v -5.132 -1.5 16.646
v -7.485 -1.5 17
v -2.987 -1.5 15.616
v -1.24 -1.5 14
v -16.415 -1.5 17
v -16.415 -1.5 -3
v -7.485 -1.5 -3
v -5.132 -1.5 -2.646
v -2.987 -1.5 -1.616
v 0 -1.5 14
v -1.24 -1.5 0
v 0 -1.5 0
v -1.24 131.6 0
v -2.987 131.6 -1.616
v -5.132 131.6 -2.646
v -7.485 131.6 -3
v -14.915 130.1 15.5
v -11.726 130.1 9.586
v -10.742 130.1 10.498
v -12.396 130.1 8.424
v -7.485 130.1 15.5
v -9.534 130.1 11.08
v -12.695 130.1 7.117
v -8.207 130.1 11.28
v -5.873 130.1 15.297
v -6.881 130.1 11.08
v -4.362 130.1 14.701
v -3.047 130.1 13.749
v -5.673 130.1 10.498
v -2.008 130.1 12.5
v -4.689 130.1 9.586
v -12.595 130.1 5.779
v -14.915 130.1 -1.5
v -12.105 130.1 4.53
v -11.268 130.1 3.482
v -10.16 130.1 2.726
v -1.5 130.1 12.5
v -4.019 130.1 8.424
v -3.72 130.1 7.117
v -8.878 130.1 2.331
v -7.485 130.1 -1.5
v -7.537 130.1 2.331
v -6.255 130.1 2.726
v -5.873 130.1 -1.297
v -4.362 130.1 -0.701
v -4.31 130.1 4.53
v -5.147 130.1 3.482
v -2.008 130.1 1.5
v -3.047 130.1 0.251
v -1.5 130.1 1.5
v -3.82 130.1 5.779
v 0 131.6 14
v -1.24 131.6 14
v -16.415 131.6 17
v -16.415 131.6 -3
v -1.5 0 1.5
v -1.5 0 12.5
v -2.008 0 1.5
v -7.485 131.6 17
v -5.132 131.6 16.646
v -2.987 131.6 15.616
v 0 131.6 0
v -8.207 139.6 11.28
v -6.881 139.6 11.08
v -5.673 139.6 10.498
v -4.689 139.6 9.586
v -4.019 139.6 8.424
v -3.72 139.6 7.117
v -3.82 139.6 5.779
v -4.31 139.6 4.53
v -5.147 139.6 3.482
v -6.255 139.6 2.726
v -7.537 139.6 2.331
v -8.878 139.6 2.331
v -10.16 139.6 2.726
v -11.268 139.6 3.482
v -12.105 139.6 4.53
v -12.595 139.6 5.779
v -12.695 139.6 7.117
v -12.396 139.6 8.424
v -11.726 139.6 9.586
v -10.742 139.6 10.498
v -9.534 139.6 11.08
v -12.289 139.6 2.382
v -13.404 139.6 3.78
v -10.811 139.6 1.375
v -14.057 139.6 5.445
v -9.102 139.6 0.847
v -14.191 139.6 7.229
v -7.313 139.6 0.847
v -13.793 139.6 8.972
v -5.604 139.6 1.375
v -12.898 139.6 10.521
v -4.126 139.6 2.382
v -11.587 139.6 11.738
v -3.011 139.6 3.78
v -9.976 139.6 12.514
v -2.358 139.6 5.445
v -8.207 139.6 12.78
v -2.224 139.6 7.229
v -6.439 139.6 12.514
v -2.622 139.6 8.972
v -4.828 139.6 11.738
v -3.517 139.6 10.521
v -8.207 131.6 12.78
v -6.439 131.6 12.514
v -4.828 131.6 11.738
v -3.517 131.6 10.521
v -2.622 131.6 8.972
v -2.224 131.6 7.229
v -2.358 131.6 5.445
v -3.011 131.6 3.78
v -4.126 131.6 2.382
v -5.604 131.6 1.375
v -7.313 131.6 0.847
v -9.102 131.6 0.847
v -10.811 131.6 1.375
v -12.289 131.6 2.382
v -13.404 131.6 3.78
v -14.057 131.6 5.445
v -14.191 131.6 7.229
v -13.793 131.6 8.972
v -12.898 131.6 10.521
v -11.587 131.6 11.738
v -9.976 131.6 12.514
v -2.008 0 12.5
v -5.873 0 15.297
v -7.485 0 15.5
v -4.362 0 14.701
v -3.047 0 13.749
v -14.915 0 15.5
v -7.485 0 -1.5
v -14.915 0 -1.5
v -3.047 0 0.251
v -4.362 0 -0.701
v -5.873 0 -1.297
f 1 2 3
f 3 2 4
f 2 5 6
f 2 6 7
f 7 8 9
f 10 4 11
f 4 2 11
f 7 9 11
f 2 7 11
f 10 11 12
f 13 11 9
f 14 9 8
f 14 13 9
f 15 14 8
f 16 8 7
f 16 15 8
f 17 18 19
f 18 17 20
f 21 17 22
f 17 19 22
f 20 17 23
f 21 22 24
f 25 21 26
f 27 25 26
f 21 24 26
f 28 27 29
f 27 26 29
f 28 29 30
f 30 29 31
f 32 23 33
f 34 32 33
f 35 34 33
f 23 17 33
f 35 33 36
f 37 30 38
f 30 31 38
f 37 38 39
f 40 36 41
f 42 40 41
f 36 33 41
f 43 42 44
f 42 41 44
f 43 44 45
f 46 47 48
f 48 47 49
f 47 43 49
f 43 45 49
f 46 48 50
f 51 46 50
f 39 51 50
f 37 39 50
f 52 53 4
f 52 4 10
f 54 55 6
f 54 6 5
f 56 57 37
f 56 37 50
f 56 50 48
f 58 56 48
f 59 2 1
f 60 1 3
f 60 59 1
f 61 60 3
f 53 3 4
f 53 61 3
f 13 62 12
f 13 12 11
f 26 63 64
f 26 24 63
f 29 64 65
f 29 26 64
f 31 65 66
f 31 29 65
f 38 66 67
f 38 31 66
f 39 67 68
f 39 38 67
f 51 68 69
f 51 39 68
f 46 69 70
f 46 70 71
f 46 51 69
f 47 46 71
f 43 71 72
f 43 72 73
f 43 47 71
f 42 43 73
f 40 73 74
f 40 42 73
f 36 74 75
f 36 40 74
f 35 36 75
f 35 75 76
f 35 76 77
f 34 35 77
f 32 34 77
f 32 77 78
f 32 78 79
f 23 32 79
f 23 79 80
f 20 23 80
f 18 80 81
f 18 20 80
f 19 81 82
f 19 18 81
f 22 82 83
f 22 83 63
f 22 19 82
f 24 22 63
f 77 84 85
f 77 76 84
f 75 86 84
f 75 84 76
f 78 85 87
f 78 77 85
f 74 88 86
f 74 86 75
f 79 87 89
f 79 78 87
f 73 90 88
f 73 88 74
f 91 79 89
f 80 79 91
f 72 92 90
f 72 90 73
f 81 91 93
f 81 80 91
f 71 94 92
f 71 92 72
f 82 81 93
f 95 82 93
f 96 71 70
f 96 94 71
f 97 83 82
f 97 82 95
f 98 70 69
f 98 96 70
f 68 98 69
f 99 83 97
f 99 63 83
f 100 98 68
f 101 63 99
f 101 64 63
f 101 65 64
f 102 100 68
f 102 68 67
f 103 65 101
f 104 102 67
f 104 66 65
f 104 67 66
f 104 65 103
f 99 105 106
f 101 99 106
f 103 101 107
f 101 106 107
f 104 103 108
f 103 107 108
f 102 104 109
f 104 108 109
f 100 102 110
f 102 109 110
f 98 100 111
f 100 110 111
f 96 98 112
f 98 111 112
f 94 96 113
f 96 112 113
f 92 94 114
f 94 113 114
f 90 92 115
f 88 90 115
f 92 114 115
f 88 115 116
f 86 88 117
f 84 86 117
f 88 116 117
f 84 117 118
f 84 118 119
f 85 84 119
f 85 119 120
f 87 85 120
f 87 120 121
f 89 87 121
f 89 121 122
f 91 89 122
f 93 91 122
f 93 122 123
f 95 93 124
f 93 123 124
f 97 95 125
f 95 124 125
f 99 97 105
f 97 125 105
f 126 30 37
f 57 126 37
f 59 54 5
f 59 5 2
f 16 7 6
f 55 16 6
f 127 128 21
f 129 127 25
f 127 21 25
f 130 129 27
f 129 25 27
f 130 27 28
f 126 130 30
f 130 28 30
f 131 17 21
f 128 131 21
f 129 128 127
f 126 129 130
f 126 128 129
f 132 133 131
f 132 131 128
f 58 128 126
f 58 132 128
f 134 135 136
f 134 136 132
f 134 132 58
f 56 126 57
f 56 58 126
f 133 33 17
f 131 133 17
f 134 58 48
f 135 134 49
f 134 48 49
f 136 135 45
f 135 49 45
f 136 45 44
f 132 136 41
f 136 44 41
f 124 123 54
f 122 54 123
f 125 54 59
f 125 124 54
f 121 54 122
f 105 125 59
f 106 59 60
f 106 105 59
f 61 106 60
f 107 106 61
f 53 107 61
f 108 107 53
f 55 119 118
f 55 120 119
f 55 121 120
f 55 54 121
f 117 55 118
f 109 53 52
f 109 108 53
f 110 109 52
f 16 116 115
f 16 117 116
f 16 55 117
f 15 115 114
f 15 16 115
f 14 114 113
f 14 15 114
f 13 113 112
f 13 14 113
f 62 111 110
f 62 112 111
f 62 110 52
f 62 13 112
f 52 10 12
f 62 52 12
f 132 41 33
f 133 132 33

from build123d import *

# Parameters (mm, degrees)
BOSS_EXTRUDE1_DEPTH = 1.5
BOSS_EXTRUDE2_START = 131.6
BOSS_EXTRUDE2_DEPTH = 131.6
BOSS_EXTRUDE3_DEPTH = 1.5
SKETCH4_R           = 6
SKETCH4_R_2         = 4.5
BOSS_EXTRUDE4_DEPTH = 8
CUT_EXTRUDE2_START  = -8
SKETCH6_R           = 4.5
CUT_EXTRUDE2_DEPTH  = 8


with BuildPart() as part:
    # Sketch1 → Boss-Extrude1 (new body)
    with BuildSketch(Plane(origin=(0, 0, 0), x_dir=(1, 0, 0), z_dir=(0, 1, 0))):
        with BuildLine():
            Line((-16.414997998, 3), (-16.414997998, -17))
            Line((-16.414997998, -17), (-7.484997998, -17))
            ThreePointArc((-7.484997998, -17), (-4.020896383, -16.211102551), (-1.24, -14))
            Line((-1.24, -14), (0, -14))
            Line((0, -14), (0, 0))
            Line((0, 0), (-1.24, 0))
            ThreePointArc((-1.24, 0), (-4.020896383, 2.211102551), (-7.484997998, 3))
            Line((-7.484997998, 3), (-16.414997998, 3))
        make_face()
    extrude(amount=-BOSS_EXTRUDE1_DEPTH)

    # Sketch2 → Boss-Extrude2 (add)
    with BuildSketch(Plane(origin=(0, 0, 0), x_dir=(1, 0, 0), z_dir=(0, 1, 0)).offset(BOSS_EXTRUDE2_START)):
        with BuildLine():
            Line((-16.414997998, 3), (-16.414997998, -17))
            Line((-16.414997998, -17), (-7.484997998, -17))
            ThreePointArc((-7.484997998, -17), (-4.020896383, -16.211102551), (-1.24, -14))
            Line((-1.24, -14), (0, -14))
            Line((0, -14), (0, 0))
            Line((0, 0), (-1.24, 0))
            ThreePointArc((-1.24, 0), (-4.020896383, 2.211102551), (-7.484997998, 3))
            Line((-7.484997998, 3), (-16.414997998, 3))
        make_face()
        with BuildLine():
            Line((-7.484997998, 1.5), (-14.914997998, 1.5))
            Line((-14.914997998, 1.5), (-14.914997998, -15.5))
            Line((-14.914997998, -15.5), (-7.484997998, -15.5))
            ThreePointArc((-7.484997998, -15.5), (-4.362498999, -14.700877125), (-2.007772423, -12.5))
            Line((-2.007772423, -12.5), (-1.5, -12.5))
            Line((-1.5, -12.5), (-1.5, -1.5))
            Line((-1.5, -1.5), (-2.007772423, -1.5))
            ThreePointArc((-2.007772423, -1.5), (-4.362498999, 0.700877125), (-7.484997998, 1.5))
        make_face(mode=Mode.SUBTRACT)
    extrude(amount=-BOSS_EXTRUDE2_DEPTH)

    # Sketch3 → Boss-Extrude3 (add)
    with BuildSketch(Plane(origin=(0, 131.6, 0), x_dir=(1, 0, 0), z_dir=(0, 1, 0))):
        with BuildLine():
            Line((-7.484997998, 3), (-16.414997998, 3))
            Line((-16.414997998, 3), (-16.414997998, -17))
            Line((-16.414997998, -17), (-7.484997998, -17))
            ThreePointArc((-7.484997998, -17), (-4.020896383, -16.211102551), (-1.24, -14))
            Line((-1.24, -14), (0, -14))
            Line((0, -14), (0, 0))
            Line((0, 0), (-1.24, 0))
            ThreePointArc((-1.24, 0), (-4.020896383, 2.211102551), (-7.484997998, 3))
        make_face()
    extrude(amount=-BOSS_EXTRUDE3_DEPTH)

    # Sketch4 → Boss-Extrude4 (add)
    with BuildSketch(Plane(origin=(0, 131.6, 0), x_dir=(1, 0, 0), z_dir=(0, 1, 0))):
        with Locations(Location((-8.207498999, -6.780386744, 0), (0, 0, 270))):
            Circle(SKETCH4_R)
        with Locations(Location((-8.207498999, -6.780386744, 0), (0, 0, 270))):
            Circle(SKETCH4_R_2, mode=Mode.SUBTRACT)
    extrude(amount=BOSS_EXTRUDE4_DEPTH)

    # Sketch6 → Cut-Extrude2 (cut)
    with BuildSketch(Plane(origin=(0, 131.6, 0), x_dir=(1, 0, 0), z_dir=(0, 1, 0)).offset(CUT_EXTRUDE2_START)):
        with Locations(Location((-8.207498999, -6.780386744, 0), (0, 0, 270))):
            Circle(SKETCH6_R)
    extrude(amount=CUT_EXTRUDE2_DEPTH, mode=Mode.SUBTRACT)


solid = part.part
